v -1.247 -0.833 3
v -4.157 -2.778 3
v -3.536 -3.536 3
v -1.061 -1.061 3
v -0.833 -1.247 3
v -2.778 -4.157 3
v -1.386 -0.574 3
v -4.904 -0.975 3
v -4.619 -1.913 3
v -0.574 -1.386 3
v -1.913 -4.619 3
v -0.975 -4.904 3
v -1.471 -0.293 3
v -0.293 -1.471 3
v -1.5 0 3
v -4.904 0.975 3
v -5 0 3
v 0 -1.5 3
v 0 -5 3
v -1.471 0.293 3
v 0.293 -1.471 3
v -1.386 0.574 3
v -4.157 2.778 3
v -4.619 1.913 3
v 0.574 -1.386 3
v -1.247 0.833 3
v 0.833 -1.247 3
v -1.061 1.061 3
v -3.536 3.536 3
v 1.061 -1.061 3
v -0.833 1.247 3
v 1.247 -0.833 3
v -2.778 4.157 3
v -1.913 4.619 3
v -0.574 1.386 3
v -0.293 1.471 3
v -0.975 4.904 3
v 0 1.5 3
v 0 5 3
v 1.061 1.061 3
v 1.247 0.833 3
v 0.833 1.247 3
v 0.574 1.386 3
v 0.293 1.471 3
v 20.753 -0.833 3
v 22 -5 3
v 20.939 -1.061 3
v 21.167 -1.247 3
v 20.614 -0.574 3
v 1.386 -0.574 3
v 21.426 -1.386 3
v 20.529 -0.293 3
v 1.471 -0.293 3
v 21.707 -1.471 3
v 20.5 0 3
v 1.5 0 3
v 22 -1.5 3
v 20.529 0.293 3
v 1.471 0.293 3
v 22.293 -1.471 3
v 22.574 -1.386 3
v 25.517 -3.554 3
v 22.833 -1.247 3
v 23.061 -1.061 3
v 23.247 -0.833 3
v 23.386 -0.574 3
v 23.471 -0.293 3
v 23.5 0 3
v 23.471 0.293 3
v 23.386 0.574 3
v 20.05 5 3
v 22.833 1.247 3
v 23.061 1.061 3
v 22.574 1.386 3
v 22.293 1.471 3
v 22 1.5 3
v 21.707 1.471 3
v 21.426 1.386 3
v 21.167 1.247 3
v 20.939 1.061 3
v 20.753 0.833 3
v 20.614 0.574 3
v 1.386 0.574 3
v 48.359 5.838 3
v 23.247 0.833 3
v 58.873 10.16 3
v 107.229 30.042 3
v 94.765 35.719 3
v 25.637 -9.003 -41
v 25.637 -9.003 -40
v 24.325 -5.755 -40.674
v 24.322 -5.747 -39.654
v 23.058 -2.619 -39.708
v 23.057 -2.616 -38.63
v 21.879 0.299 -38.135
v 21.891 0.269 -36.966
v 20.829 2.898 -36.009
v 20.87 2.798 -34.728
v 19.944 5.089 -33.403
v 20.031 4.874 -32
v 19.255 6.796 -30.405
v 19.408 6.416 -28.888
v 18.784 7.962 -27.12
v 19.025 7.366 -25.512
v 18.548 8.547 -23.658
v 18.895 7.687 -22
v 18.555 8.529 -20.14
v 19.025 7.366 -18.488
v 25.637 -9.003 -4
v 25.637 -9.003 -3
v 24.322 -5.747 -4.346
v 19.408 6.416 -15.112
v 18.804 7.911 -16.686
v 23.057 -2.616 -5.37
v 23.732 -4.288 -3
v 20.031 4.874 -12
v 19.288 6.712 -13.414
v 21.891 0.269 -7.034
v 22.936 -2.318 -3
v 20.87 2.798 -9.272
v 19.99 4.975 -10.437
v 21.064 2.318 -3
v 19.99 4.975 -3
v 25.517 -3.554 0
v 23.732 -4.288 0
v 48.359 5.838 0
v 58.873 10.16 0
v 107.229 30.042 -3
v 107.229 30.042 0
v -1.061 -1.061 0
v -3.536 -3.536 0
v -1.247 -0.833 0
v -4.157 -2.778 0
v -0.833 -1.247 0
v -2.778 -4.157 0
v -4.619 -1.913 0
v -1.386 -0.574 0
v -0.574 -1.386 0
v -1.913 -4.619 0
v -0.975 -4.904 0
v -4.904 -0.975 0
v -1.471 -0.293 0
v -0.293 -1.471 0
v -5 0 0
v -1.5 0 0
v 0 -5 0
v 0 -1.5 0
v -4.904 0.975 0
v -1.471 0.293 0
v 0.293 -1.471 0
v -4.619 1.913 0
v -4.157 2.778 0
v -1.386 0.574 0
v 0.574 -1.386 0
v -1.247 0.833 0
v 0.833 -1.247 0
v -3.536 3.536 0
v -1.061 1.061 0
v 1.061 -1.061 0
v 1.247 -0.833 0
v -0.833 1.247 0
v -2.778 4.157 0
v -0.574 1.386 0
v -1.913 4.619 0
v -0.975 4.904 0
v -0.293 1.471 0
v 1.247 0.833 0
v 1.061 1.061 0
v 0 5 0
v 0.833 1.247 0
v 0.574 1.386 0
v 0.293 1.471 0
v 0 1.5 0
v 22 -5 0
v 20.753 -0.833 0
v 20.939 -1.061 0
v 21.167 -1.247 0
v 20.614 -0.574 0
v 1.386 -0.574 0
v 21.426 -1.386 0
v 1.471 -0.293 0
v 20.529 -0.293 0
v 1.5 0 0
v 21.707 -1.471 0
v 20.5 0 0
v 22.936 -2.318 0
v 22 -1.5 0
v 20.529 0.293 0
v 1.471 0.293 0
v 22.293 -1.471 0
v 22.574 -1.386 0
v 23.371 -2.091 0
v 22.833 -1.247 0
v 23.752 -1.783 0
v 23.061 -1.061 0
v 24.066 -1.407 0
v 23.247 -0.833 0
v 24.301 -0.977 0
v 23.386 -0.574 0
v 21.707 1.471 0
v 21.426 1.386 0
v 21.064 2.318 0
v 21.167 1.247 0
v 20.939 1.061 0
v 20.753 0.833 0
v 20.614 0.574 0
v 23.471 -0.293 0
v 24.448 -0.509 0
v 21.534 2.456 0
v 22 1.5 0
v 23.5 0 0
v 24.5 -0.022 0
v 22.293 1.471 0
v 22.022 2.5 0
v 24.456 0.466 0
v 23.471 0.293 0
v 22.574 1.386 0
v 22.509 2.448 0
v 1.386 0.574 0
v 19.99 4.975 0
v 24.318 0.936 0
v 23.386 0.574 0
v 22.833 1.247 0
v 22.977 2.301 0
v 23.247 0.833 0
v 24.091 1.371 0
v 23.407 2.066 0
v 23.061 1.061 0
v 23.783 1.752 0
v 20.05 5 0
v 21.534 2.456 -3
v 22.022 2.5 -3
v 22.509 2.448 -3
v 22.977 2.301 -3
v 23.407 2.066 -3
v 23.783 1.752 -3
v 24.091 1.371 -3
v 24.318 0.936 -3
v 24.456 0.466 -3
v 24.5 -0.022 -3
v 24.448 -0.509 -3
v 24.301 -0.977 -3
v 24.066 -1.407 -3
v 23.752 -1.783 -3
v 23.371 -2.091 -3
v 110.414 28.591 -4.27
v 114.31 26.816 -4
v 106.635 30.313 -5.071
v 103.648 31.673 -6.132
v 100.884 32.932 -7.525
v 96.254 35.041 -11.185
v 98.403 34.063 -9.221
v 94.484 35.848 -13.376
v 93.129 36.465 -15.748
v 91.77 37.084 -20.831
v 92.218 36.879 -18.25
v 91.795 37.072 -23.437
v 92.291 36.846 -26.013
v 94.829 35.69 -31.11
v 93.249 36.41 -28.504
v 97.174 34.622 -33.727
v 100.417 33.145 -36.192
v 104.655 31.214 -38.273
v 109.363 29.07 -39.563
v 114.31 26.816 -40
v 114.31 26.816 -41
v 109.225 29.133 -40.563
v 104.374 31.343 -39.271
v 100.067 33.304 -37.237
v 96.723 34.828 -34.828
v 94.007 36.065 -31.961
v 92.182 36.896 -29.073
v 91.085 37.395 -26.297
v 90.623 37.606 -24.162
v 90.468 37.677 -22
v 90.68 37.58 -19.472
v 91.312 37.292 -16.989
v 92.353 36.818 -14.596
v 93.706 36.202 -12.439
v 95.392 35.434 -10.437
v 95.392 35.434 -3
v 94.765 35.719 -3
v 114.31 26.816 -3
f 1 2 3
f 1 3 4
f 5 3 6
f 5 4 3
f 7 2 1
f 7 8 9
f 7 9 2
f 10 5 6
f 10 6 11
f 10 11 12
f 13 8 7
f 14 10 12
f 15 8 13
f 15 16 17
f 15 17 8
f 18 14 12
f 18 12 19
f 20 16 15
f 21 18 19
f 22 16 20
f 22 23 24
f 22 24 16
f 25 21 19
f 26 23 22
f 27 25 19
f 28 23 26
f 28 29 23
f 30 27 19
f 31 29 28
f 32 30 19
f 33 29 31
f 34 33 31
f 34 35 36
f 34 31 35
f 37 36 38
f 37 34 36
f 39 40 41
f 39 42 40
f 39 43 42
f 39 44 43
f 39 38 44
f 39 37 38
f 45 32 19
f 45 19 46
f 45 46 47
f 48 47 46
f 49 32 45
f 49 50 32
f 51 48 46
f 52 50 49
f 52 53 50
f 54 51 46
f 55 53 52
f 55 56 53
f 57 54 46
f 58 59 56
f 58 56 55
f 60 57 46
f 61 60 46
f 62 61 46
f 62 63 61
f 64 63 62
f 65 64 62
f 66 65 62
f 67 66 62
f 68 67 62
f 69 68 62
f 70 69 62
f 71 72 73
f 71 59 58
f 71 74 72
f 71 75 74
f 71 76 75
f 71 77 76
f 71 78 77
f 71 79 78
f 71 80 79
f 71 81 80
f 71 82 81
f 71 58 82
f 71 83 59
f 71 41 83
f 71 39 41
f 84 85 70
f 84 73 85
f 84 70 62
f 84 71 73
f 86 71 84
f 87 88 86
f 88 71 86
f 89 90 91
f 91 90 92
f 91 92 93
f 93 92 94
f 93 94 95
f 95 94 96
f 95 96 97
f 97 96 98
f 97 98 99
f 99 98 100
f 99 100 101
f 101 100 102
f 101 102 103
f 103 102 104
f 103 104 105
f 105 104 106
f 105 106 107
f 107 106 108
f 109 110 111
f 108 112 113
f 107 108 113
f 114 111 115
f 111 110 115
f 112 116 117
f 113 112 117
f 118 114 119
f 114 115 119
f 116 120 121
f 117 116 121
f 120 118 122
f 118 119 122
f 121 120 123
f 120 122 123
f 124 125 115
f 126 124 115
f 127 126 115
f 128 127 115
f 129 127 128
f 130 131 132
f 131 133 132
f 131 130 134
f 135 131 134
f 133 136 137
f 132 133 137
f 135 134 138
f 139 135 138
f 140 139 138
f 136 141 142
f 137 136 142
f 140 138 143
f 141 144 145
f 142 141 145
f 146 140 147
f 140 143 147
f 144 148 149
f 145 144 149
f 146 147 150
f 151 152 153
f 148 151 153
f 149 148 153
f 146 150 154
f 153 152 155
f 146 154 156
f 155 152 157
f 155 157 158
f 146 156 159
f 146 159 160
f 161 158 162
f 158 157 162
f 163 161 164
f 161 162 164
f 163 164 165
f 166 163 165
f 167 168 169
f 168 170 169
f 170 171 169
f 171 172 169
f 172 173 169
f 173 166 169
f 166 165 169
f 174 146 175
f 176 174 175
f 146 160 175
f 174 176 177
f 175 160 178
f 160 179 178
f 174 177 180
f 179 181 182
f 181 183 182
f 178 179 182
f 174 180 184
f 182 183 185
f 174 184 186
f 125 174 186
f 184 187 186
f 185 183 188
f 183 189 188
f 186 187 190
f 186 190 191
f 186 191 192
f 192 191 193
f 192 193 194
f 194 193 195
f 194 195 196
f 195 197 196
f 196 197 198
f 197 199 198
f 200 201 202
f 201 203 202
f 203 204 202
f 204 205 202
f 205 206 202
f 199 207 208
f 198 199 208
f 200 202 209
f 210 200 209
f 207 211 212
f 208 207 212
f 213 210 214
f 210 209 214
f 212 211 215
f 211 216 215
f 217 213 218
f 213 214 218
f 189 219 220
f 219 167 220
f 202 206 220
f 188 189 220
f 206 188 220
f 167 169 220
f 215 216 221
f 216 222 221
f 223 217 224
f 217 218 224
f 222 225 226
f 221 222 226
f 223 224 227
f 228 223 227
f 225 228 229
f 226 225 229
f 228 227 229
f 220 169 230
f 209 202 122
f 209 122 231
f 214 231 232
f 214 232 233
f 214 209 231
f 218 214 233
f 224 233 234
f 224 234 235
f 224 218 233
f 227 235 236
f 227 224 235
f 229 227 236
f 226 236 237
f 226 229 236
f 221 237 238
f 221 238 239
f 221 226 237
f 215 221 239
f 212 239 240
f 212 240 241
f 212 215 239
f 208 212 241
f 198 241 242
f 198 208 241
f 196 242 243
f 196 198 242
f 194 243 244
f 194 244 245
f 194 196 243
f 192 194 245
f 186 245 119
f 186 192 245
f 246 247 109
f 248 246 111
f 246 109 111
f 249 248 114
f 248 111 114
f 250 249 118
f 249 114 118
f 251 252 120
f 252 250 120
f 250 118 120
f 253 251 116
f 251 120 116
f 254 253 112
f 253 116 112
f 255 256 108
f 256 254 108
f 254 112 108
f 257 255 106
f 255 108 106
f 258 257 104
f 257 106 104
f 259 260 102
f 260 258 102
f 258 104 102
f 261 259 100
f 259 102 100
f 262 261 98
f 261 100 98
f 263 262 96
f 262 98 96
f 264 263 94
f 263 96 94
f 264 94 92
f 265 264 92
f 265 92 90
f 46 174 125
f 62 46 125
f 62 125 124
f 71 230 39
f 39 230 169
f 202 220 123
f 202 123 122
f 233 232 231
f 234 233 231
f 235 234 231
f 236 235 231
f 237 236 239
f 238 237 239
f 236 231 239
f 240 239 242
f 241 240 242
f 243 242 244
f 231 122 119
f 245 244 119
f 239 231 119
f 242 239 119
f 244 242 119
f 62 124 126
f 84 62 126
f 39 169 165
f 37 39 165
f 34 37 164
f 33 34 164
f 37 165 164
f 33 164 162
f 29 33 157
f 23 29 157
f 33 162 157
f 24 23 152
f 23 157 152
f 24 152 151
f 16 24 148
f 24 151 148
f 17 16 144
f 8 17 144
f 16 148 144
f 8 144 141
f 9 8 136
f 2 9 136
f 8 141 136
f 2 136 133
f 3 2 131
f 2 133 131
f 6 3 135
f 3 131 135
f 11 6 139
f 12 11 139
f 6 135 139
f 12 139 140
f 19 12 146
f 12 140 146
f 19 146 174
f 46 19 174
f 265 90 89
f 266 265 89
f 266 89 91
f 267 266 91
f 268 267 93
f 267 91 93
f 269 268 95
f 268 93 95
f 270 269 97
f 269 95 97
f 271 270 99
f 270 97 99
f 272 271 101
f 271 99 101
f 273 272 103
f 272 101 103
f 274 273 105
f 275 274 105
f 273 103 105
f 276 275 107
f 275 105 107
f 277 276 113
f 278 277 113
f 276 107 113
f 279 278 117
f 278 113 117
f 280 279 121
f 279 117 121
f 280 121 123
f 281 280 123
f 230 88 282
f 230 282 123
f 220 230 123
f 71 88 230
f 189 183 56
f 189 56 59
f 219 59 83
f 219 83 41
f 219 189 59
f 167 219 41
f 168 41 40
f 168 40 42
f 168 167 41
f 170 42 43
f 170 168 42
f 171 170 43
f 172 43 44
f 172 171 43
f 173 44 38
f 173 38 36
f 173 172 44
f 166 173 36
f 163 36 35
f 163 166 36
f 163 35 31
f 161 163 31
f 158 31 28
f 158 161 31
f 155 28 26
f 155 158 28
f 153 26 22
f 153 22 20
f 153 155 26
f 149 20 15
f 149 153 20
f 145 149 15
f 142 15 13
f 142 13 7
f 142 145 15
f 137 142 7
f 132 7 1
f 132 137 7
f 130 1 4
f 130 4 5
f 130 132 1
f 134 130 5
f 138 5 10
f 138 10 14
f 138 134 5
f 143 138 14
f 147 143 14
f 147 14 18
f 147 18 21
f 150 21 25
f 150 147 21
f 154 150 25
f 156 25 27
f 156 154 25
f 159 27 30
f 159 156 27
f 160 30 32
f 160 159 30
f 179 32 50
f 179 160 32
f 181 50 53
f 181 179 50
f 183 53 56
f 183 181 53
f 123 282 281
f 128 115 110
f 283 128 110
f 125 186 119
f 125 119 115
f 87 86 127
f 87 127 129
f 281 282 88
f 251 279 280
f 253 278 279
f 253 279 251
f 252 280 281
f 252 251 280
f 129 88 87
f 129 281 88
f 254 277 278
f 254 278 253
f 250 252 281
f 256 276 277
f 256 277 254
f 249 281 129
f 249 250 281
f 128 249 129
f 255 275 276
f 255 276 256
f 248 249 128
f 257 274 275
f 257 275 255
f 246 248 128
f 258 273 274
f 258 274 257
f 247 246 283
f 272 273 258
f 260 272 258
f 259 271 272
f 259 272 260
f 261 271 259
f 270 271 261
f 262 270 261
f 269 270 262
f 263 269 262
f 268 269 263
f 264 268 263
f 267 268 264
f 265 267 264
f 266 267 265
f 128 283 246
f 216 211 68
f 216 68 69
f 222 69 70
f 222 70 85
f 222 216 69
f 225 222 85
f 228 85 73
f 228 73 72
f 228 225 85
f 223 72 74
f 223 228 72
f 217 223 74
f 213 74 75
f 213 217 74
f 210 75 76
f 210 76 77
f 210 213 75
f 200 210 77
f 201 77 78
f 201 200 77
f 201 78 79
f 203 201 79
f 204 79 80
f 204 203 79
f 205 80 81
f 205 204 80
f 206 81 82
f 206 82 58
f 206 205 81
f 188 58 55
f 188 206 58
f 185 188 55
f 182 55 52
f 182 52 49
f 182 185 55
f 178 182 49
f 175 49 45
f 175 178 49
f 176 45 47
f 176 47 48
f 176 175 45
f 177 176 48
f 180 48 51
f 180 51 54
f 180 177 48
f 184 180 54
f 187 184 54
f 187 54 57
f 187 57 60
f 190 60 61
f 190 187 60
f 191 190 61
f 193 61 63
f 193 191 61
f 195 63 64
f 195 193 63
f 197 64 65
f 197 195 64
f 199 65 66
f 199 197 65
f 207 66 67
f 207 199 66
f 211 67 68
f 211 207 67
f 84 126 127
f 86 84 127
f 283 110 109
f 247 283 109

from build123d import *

# Parameters (mm, degrees)
SKETCH1_R           = 1.5
BOSS_EXTRUDE1_DEPTH = 3
EXTRUDE_1_DEPTH     = 3
EXTRUDE_2_DEPTH     = 3
EXTRUDE_3_REACH     = 100.745
CUT_EXTRUDE_1_DEPTH = 45


with BuildPart() as part:
    # Sketch1 → Boss-Extrude1 (new body)
    # profile 1 of 2: a face of its own
    with BuildSketch(Plane.XY):
        with BuildLine():
            Line((20.05, 5), (0, 5))
            ThreePointArc((0, 5), (-5, 0), (0, -5))
            Line((0, -5), (22, -5))
            Line((22, -5), (25.516973514, -3.553997369))
            ThreePointArc((25.516973514, -3.553997369), (26.624391141, 1.901317064), (22, 5))
            Line((22, 5), (20.05, 5))
        make_face()
        Circle(SKETCH1_R, mode=Mode.SUBTRACT)
        with Locations((22, 0)):
            Circle(SKETCH1_R, mode=Mode.SUBTRACT)
    # profile 2 of 2: a face of its own
    with BuildSketch(Plane.XY):
        with BuildLine():
            Line((46.409029503, 15.837507263), (20.05, 5))
            Line((20.05, 5), (22, 5))
            ThreePointArc((22, 5), (26.624391141, 1.901317064), (25.516973514, -3.553997369))
            Line((25.516973514, -3.553997369), (48.359029503, 5.837507263))
            Line((48.359029503, 5.837507263), (58.872830999, 10.16025367))
            Line((58.872830999, 10.16025367), (53.359871826, 12.67140304))
            Line((53.359871826, 12.67140304), (46.409029503, 15.837507263))
        make_face()
    extrude(amount=BOSS_EXTRUDE1_DEPTH)

    # 草图1 → 凸台-拉伸1 (add)
    with BuildSketch(Plane.XY.offset(3)):
        Polygon((46.409029503, 15.837507263), (58.872830999, 10.16025367), (111.008388469, 31.59577286), (98.544586973, 37.273026453), align=None)
    extrude(amount=-EXTRUDE_1_DEPTH)

    # 草图4 → 凸台-拉伸2 (add)
    with BuildSketch(Plane(origin=(0, 0, 0), x_dir=(-1, 0, 0), z_dir=(0, 0, -1))):
        with BuildLine():
            Line((-111.008388469, 31.59577286), (-98.544586973, 37.273026453))
            Line((-98.544586973, 37.273026453), (-19.990187018, 4.97540791))
            Line((-19.990187018, 4.97540791), (-21.063636635, 2.318021494))
            ThreePointArc((-21.063636635, 2.318021494), (-24.318021494, 0.936363365), (-22.936363365, -2.318021494))
            Line((-22.936363365, -2.318021494), (-23.732077199, -4.287856967))
            Line((-23.732077199, -4.287856967), (-111.008388469, 31.59577286))
        make_face()
    extrude(amount=EXTRUDE_2_DEPTH)

    # 凸台-拉伸3: up to this plane
    extrude_3_end = Plane(origin=(98.544586973, 37.273026453, -70.058401543), z_dir=(0.4145222599320868, 0.9100391727946636, 0))
    # 草图5 → 凸台-拉伸3 (add, up to the surface)
    with BuildSketch(Plane(origin=(18.913747244, 7.640196631, 0), x_dir=(0.3745453459539944, -0.9272085977945863, 0), z_dir=(-0.9272085977945863, -0.3745453459539944, 0)), mode=Mode.PRIVATE) as extrude_3_sk1:
        with BuildLine():
            Line((17.949999281, -3), (17.949999281, -4))
            ThreePointArc((17.949999281, -4), (-0.050000719, -22), (17.949999281, -40))
            Line((17.949999281, -40), (17.949999281, -41))
            ThreePointArc((17.949999281, -41), (0.910251194, -30.405176091), (2.873990521, -10.43652475))
            Line((2.873990521, -10.43652475), (2.873990521, -3))
            Line((2.873990521, -3), (17.949999281, -3))
        make_face()
    extrude_3_tool1 = split(extrude(extrude_3_sk1.sketch, amount=-EXTRUDE_3_REACH, mode=Mode.PRIVATE), bisect_by=extrude_3_end, keep=Keep.BOTH, mode=Mode.PRIVATE)
    add(extrude_3_tool1.solids().sort_by_distance((20.149314, 4.581481, -6.718262))[0])

    # 草图6 → 切除-拉伸1 (cut, symmetric)
    with BuildSketch(Plane(origin=(0, 0, 0), x_dir=(-1, 0, 0), z_dir=(0, 0, -1))):
        Polygon((-118.12130065, 28.35584592), (-94.278560376, 39.216198833), (-90.467733039, 37.676817461), (-114.310473313, 26.816464549), align=None)
    extrude(amount=CUT_EXTRUDE_1_DEPTH, both=True, mode=Mode.SUBTRACT)


solid = part.part
